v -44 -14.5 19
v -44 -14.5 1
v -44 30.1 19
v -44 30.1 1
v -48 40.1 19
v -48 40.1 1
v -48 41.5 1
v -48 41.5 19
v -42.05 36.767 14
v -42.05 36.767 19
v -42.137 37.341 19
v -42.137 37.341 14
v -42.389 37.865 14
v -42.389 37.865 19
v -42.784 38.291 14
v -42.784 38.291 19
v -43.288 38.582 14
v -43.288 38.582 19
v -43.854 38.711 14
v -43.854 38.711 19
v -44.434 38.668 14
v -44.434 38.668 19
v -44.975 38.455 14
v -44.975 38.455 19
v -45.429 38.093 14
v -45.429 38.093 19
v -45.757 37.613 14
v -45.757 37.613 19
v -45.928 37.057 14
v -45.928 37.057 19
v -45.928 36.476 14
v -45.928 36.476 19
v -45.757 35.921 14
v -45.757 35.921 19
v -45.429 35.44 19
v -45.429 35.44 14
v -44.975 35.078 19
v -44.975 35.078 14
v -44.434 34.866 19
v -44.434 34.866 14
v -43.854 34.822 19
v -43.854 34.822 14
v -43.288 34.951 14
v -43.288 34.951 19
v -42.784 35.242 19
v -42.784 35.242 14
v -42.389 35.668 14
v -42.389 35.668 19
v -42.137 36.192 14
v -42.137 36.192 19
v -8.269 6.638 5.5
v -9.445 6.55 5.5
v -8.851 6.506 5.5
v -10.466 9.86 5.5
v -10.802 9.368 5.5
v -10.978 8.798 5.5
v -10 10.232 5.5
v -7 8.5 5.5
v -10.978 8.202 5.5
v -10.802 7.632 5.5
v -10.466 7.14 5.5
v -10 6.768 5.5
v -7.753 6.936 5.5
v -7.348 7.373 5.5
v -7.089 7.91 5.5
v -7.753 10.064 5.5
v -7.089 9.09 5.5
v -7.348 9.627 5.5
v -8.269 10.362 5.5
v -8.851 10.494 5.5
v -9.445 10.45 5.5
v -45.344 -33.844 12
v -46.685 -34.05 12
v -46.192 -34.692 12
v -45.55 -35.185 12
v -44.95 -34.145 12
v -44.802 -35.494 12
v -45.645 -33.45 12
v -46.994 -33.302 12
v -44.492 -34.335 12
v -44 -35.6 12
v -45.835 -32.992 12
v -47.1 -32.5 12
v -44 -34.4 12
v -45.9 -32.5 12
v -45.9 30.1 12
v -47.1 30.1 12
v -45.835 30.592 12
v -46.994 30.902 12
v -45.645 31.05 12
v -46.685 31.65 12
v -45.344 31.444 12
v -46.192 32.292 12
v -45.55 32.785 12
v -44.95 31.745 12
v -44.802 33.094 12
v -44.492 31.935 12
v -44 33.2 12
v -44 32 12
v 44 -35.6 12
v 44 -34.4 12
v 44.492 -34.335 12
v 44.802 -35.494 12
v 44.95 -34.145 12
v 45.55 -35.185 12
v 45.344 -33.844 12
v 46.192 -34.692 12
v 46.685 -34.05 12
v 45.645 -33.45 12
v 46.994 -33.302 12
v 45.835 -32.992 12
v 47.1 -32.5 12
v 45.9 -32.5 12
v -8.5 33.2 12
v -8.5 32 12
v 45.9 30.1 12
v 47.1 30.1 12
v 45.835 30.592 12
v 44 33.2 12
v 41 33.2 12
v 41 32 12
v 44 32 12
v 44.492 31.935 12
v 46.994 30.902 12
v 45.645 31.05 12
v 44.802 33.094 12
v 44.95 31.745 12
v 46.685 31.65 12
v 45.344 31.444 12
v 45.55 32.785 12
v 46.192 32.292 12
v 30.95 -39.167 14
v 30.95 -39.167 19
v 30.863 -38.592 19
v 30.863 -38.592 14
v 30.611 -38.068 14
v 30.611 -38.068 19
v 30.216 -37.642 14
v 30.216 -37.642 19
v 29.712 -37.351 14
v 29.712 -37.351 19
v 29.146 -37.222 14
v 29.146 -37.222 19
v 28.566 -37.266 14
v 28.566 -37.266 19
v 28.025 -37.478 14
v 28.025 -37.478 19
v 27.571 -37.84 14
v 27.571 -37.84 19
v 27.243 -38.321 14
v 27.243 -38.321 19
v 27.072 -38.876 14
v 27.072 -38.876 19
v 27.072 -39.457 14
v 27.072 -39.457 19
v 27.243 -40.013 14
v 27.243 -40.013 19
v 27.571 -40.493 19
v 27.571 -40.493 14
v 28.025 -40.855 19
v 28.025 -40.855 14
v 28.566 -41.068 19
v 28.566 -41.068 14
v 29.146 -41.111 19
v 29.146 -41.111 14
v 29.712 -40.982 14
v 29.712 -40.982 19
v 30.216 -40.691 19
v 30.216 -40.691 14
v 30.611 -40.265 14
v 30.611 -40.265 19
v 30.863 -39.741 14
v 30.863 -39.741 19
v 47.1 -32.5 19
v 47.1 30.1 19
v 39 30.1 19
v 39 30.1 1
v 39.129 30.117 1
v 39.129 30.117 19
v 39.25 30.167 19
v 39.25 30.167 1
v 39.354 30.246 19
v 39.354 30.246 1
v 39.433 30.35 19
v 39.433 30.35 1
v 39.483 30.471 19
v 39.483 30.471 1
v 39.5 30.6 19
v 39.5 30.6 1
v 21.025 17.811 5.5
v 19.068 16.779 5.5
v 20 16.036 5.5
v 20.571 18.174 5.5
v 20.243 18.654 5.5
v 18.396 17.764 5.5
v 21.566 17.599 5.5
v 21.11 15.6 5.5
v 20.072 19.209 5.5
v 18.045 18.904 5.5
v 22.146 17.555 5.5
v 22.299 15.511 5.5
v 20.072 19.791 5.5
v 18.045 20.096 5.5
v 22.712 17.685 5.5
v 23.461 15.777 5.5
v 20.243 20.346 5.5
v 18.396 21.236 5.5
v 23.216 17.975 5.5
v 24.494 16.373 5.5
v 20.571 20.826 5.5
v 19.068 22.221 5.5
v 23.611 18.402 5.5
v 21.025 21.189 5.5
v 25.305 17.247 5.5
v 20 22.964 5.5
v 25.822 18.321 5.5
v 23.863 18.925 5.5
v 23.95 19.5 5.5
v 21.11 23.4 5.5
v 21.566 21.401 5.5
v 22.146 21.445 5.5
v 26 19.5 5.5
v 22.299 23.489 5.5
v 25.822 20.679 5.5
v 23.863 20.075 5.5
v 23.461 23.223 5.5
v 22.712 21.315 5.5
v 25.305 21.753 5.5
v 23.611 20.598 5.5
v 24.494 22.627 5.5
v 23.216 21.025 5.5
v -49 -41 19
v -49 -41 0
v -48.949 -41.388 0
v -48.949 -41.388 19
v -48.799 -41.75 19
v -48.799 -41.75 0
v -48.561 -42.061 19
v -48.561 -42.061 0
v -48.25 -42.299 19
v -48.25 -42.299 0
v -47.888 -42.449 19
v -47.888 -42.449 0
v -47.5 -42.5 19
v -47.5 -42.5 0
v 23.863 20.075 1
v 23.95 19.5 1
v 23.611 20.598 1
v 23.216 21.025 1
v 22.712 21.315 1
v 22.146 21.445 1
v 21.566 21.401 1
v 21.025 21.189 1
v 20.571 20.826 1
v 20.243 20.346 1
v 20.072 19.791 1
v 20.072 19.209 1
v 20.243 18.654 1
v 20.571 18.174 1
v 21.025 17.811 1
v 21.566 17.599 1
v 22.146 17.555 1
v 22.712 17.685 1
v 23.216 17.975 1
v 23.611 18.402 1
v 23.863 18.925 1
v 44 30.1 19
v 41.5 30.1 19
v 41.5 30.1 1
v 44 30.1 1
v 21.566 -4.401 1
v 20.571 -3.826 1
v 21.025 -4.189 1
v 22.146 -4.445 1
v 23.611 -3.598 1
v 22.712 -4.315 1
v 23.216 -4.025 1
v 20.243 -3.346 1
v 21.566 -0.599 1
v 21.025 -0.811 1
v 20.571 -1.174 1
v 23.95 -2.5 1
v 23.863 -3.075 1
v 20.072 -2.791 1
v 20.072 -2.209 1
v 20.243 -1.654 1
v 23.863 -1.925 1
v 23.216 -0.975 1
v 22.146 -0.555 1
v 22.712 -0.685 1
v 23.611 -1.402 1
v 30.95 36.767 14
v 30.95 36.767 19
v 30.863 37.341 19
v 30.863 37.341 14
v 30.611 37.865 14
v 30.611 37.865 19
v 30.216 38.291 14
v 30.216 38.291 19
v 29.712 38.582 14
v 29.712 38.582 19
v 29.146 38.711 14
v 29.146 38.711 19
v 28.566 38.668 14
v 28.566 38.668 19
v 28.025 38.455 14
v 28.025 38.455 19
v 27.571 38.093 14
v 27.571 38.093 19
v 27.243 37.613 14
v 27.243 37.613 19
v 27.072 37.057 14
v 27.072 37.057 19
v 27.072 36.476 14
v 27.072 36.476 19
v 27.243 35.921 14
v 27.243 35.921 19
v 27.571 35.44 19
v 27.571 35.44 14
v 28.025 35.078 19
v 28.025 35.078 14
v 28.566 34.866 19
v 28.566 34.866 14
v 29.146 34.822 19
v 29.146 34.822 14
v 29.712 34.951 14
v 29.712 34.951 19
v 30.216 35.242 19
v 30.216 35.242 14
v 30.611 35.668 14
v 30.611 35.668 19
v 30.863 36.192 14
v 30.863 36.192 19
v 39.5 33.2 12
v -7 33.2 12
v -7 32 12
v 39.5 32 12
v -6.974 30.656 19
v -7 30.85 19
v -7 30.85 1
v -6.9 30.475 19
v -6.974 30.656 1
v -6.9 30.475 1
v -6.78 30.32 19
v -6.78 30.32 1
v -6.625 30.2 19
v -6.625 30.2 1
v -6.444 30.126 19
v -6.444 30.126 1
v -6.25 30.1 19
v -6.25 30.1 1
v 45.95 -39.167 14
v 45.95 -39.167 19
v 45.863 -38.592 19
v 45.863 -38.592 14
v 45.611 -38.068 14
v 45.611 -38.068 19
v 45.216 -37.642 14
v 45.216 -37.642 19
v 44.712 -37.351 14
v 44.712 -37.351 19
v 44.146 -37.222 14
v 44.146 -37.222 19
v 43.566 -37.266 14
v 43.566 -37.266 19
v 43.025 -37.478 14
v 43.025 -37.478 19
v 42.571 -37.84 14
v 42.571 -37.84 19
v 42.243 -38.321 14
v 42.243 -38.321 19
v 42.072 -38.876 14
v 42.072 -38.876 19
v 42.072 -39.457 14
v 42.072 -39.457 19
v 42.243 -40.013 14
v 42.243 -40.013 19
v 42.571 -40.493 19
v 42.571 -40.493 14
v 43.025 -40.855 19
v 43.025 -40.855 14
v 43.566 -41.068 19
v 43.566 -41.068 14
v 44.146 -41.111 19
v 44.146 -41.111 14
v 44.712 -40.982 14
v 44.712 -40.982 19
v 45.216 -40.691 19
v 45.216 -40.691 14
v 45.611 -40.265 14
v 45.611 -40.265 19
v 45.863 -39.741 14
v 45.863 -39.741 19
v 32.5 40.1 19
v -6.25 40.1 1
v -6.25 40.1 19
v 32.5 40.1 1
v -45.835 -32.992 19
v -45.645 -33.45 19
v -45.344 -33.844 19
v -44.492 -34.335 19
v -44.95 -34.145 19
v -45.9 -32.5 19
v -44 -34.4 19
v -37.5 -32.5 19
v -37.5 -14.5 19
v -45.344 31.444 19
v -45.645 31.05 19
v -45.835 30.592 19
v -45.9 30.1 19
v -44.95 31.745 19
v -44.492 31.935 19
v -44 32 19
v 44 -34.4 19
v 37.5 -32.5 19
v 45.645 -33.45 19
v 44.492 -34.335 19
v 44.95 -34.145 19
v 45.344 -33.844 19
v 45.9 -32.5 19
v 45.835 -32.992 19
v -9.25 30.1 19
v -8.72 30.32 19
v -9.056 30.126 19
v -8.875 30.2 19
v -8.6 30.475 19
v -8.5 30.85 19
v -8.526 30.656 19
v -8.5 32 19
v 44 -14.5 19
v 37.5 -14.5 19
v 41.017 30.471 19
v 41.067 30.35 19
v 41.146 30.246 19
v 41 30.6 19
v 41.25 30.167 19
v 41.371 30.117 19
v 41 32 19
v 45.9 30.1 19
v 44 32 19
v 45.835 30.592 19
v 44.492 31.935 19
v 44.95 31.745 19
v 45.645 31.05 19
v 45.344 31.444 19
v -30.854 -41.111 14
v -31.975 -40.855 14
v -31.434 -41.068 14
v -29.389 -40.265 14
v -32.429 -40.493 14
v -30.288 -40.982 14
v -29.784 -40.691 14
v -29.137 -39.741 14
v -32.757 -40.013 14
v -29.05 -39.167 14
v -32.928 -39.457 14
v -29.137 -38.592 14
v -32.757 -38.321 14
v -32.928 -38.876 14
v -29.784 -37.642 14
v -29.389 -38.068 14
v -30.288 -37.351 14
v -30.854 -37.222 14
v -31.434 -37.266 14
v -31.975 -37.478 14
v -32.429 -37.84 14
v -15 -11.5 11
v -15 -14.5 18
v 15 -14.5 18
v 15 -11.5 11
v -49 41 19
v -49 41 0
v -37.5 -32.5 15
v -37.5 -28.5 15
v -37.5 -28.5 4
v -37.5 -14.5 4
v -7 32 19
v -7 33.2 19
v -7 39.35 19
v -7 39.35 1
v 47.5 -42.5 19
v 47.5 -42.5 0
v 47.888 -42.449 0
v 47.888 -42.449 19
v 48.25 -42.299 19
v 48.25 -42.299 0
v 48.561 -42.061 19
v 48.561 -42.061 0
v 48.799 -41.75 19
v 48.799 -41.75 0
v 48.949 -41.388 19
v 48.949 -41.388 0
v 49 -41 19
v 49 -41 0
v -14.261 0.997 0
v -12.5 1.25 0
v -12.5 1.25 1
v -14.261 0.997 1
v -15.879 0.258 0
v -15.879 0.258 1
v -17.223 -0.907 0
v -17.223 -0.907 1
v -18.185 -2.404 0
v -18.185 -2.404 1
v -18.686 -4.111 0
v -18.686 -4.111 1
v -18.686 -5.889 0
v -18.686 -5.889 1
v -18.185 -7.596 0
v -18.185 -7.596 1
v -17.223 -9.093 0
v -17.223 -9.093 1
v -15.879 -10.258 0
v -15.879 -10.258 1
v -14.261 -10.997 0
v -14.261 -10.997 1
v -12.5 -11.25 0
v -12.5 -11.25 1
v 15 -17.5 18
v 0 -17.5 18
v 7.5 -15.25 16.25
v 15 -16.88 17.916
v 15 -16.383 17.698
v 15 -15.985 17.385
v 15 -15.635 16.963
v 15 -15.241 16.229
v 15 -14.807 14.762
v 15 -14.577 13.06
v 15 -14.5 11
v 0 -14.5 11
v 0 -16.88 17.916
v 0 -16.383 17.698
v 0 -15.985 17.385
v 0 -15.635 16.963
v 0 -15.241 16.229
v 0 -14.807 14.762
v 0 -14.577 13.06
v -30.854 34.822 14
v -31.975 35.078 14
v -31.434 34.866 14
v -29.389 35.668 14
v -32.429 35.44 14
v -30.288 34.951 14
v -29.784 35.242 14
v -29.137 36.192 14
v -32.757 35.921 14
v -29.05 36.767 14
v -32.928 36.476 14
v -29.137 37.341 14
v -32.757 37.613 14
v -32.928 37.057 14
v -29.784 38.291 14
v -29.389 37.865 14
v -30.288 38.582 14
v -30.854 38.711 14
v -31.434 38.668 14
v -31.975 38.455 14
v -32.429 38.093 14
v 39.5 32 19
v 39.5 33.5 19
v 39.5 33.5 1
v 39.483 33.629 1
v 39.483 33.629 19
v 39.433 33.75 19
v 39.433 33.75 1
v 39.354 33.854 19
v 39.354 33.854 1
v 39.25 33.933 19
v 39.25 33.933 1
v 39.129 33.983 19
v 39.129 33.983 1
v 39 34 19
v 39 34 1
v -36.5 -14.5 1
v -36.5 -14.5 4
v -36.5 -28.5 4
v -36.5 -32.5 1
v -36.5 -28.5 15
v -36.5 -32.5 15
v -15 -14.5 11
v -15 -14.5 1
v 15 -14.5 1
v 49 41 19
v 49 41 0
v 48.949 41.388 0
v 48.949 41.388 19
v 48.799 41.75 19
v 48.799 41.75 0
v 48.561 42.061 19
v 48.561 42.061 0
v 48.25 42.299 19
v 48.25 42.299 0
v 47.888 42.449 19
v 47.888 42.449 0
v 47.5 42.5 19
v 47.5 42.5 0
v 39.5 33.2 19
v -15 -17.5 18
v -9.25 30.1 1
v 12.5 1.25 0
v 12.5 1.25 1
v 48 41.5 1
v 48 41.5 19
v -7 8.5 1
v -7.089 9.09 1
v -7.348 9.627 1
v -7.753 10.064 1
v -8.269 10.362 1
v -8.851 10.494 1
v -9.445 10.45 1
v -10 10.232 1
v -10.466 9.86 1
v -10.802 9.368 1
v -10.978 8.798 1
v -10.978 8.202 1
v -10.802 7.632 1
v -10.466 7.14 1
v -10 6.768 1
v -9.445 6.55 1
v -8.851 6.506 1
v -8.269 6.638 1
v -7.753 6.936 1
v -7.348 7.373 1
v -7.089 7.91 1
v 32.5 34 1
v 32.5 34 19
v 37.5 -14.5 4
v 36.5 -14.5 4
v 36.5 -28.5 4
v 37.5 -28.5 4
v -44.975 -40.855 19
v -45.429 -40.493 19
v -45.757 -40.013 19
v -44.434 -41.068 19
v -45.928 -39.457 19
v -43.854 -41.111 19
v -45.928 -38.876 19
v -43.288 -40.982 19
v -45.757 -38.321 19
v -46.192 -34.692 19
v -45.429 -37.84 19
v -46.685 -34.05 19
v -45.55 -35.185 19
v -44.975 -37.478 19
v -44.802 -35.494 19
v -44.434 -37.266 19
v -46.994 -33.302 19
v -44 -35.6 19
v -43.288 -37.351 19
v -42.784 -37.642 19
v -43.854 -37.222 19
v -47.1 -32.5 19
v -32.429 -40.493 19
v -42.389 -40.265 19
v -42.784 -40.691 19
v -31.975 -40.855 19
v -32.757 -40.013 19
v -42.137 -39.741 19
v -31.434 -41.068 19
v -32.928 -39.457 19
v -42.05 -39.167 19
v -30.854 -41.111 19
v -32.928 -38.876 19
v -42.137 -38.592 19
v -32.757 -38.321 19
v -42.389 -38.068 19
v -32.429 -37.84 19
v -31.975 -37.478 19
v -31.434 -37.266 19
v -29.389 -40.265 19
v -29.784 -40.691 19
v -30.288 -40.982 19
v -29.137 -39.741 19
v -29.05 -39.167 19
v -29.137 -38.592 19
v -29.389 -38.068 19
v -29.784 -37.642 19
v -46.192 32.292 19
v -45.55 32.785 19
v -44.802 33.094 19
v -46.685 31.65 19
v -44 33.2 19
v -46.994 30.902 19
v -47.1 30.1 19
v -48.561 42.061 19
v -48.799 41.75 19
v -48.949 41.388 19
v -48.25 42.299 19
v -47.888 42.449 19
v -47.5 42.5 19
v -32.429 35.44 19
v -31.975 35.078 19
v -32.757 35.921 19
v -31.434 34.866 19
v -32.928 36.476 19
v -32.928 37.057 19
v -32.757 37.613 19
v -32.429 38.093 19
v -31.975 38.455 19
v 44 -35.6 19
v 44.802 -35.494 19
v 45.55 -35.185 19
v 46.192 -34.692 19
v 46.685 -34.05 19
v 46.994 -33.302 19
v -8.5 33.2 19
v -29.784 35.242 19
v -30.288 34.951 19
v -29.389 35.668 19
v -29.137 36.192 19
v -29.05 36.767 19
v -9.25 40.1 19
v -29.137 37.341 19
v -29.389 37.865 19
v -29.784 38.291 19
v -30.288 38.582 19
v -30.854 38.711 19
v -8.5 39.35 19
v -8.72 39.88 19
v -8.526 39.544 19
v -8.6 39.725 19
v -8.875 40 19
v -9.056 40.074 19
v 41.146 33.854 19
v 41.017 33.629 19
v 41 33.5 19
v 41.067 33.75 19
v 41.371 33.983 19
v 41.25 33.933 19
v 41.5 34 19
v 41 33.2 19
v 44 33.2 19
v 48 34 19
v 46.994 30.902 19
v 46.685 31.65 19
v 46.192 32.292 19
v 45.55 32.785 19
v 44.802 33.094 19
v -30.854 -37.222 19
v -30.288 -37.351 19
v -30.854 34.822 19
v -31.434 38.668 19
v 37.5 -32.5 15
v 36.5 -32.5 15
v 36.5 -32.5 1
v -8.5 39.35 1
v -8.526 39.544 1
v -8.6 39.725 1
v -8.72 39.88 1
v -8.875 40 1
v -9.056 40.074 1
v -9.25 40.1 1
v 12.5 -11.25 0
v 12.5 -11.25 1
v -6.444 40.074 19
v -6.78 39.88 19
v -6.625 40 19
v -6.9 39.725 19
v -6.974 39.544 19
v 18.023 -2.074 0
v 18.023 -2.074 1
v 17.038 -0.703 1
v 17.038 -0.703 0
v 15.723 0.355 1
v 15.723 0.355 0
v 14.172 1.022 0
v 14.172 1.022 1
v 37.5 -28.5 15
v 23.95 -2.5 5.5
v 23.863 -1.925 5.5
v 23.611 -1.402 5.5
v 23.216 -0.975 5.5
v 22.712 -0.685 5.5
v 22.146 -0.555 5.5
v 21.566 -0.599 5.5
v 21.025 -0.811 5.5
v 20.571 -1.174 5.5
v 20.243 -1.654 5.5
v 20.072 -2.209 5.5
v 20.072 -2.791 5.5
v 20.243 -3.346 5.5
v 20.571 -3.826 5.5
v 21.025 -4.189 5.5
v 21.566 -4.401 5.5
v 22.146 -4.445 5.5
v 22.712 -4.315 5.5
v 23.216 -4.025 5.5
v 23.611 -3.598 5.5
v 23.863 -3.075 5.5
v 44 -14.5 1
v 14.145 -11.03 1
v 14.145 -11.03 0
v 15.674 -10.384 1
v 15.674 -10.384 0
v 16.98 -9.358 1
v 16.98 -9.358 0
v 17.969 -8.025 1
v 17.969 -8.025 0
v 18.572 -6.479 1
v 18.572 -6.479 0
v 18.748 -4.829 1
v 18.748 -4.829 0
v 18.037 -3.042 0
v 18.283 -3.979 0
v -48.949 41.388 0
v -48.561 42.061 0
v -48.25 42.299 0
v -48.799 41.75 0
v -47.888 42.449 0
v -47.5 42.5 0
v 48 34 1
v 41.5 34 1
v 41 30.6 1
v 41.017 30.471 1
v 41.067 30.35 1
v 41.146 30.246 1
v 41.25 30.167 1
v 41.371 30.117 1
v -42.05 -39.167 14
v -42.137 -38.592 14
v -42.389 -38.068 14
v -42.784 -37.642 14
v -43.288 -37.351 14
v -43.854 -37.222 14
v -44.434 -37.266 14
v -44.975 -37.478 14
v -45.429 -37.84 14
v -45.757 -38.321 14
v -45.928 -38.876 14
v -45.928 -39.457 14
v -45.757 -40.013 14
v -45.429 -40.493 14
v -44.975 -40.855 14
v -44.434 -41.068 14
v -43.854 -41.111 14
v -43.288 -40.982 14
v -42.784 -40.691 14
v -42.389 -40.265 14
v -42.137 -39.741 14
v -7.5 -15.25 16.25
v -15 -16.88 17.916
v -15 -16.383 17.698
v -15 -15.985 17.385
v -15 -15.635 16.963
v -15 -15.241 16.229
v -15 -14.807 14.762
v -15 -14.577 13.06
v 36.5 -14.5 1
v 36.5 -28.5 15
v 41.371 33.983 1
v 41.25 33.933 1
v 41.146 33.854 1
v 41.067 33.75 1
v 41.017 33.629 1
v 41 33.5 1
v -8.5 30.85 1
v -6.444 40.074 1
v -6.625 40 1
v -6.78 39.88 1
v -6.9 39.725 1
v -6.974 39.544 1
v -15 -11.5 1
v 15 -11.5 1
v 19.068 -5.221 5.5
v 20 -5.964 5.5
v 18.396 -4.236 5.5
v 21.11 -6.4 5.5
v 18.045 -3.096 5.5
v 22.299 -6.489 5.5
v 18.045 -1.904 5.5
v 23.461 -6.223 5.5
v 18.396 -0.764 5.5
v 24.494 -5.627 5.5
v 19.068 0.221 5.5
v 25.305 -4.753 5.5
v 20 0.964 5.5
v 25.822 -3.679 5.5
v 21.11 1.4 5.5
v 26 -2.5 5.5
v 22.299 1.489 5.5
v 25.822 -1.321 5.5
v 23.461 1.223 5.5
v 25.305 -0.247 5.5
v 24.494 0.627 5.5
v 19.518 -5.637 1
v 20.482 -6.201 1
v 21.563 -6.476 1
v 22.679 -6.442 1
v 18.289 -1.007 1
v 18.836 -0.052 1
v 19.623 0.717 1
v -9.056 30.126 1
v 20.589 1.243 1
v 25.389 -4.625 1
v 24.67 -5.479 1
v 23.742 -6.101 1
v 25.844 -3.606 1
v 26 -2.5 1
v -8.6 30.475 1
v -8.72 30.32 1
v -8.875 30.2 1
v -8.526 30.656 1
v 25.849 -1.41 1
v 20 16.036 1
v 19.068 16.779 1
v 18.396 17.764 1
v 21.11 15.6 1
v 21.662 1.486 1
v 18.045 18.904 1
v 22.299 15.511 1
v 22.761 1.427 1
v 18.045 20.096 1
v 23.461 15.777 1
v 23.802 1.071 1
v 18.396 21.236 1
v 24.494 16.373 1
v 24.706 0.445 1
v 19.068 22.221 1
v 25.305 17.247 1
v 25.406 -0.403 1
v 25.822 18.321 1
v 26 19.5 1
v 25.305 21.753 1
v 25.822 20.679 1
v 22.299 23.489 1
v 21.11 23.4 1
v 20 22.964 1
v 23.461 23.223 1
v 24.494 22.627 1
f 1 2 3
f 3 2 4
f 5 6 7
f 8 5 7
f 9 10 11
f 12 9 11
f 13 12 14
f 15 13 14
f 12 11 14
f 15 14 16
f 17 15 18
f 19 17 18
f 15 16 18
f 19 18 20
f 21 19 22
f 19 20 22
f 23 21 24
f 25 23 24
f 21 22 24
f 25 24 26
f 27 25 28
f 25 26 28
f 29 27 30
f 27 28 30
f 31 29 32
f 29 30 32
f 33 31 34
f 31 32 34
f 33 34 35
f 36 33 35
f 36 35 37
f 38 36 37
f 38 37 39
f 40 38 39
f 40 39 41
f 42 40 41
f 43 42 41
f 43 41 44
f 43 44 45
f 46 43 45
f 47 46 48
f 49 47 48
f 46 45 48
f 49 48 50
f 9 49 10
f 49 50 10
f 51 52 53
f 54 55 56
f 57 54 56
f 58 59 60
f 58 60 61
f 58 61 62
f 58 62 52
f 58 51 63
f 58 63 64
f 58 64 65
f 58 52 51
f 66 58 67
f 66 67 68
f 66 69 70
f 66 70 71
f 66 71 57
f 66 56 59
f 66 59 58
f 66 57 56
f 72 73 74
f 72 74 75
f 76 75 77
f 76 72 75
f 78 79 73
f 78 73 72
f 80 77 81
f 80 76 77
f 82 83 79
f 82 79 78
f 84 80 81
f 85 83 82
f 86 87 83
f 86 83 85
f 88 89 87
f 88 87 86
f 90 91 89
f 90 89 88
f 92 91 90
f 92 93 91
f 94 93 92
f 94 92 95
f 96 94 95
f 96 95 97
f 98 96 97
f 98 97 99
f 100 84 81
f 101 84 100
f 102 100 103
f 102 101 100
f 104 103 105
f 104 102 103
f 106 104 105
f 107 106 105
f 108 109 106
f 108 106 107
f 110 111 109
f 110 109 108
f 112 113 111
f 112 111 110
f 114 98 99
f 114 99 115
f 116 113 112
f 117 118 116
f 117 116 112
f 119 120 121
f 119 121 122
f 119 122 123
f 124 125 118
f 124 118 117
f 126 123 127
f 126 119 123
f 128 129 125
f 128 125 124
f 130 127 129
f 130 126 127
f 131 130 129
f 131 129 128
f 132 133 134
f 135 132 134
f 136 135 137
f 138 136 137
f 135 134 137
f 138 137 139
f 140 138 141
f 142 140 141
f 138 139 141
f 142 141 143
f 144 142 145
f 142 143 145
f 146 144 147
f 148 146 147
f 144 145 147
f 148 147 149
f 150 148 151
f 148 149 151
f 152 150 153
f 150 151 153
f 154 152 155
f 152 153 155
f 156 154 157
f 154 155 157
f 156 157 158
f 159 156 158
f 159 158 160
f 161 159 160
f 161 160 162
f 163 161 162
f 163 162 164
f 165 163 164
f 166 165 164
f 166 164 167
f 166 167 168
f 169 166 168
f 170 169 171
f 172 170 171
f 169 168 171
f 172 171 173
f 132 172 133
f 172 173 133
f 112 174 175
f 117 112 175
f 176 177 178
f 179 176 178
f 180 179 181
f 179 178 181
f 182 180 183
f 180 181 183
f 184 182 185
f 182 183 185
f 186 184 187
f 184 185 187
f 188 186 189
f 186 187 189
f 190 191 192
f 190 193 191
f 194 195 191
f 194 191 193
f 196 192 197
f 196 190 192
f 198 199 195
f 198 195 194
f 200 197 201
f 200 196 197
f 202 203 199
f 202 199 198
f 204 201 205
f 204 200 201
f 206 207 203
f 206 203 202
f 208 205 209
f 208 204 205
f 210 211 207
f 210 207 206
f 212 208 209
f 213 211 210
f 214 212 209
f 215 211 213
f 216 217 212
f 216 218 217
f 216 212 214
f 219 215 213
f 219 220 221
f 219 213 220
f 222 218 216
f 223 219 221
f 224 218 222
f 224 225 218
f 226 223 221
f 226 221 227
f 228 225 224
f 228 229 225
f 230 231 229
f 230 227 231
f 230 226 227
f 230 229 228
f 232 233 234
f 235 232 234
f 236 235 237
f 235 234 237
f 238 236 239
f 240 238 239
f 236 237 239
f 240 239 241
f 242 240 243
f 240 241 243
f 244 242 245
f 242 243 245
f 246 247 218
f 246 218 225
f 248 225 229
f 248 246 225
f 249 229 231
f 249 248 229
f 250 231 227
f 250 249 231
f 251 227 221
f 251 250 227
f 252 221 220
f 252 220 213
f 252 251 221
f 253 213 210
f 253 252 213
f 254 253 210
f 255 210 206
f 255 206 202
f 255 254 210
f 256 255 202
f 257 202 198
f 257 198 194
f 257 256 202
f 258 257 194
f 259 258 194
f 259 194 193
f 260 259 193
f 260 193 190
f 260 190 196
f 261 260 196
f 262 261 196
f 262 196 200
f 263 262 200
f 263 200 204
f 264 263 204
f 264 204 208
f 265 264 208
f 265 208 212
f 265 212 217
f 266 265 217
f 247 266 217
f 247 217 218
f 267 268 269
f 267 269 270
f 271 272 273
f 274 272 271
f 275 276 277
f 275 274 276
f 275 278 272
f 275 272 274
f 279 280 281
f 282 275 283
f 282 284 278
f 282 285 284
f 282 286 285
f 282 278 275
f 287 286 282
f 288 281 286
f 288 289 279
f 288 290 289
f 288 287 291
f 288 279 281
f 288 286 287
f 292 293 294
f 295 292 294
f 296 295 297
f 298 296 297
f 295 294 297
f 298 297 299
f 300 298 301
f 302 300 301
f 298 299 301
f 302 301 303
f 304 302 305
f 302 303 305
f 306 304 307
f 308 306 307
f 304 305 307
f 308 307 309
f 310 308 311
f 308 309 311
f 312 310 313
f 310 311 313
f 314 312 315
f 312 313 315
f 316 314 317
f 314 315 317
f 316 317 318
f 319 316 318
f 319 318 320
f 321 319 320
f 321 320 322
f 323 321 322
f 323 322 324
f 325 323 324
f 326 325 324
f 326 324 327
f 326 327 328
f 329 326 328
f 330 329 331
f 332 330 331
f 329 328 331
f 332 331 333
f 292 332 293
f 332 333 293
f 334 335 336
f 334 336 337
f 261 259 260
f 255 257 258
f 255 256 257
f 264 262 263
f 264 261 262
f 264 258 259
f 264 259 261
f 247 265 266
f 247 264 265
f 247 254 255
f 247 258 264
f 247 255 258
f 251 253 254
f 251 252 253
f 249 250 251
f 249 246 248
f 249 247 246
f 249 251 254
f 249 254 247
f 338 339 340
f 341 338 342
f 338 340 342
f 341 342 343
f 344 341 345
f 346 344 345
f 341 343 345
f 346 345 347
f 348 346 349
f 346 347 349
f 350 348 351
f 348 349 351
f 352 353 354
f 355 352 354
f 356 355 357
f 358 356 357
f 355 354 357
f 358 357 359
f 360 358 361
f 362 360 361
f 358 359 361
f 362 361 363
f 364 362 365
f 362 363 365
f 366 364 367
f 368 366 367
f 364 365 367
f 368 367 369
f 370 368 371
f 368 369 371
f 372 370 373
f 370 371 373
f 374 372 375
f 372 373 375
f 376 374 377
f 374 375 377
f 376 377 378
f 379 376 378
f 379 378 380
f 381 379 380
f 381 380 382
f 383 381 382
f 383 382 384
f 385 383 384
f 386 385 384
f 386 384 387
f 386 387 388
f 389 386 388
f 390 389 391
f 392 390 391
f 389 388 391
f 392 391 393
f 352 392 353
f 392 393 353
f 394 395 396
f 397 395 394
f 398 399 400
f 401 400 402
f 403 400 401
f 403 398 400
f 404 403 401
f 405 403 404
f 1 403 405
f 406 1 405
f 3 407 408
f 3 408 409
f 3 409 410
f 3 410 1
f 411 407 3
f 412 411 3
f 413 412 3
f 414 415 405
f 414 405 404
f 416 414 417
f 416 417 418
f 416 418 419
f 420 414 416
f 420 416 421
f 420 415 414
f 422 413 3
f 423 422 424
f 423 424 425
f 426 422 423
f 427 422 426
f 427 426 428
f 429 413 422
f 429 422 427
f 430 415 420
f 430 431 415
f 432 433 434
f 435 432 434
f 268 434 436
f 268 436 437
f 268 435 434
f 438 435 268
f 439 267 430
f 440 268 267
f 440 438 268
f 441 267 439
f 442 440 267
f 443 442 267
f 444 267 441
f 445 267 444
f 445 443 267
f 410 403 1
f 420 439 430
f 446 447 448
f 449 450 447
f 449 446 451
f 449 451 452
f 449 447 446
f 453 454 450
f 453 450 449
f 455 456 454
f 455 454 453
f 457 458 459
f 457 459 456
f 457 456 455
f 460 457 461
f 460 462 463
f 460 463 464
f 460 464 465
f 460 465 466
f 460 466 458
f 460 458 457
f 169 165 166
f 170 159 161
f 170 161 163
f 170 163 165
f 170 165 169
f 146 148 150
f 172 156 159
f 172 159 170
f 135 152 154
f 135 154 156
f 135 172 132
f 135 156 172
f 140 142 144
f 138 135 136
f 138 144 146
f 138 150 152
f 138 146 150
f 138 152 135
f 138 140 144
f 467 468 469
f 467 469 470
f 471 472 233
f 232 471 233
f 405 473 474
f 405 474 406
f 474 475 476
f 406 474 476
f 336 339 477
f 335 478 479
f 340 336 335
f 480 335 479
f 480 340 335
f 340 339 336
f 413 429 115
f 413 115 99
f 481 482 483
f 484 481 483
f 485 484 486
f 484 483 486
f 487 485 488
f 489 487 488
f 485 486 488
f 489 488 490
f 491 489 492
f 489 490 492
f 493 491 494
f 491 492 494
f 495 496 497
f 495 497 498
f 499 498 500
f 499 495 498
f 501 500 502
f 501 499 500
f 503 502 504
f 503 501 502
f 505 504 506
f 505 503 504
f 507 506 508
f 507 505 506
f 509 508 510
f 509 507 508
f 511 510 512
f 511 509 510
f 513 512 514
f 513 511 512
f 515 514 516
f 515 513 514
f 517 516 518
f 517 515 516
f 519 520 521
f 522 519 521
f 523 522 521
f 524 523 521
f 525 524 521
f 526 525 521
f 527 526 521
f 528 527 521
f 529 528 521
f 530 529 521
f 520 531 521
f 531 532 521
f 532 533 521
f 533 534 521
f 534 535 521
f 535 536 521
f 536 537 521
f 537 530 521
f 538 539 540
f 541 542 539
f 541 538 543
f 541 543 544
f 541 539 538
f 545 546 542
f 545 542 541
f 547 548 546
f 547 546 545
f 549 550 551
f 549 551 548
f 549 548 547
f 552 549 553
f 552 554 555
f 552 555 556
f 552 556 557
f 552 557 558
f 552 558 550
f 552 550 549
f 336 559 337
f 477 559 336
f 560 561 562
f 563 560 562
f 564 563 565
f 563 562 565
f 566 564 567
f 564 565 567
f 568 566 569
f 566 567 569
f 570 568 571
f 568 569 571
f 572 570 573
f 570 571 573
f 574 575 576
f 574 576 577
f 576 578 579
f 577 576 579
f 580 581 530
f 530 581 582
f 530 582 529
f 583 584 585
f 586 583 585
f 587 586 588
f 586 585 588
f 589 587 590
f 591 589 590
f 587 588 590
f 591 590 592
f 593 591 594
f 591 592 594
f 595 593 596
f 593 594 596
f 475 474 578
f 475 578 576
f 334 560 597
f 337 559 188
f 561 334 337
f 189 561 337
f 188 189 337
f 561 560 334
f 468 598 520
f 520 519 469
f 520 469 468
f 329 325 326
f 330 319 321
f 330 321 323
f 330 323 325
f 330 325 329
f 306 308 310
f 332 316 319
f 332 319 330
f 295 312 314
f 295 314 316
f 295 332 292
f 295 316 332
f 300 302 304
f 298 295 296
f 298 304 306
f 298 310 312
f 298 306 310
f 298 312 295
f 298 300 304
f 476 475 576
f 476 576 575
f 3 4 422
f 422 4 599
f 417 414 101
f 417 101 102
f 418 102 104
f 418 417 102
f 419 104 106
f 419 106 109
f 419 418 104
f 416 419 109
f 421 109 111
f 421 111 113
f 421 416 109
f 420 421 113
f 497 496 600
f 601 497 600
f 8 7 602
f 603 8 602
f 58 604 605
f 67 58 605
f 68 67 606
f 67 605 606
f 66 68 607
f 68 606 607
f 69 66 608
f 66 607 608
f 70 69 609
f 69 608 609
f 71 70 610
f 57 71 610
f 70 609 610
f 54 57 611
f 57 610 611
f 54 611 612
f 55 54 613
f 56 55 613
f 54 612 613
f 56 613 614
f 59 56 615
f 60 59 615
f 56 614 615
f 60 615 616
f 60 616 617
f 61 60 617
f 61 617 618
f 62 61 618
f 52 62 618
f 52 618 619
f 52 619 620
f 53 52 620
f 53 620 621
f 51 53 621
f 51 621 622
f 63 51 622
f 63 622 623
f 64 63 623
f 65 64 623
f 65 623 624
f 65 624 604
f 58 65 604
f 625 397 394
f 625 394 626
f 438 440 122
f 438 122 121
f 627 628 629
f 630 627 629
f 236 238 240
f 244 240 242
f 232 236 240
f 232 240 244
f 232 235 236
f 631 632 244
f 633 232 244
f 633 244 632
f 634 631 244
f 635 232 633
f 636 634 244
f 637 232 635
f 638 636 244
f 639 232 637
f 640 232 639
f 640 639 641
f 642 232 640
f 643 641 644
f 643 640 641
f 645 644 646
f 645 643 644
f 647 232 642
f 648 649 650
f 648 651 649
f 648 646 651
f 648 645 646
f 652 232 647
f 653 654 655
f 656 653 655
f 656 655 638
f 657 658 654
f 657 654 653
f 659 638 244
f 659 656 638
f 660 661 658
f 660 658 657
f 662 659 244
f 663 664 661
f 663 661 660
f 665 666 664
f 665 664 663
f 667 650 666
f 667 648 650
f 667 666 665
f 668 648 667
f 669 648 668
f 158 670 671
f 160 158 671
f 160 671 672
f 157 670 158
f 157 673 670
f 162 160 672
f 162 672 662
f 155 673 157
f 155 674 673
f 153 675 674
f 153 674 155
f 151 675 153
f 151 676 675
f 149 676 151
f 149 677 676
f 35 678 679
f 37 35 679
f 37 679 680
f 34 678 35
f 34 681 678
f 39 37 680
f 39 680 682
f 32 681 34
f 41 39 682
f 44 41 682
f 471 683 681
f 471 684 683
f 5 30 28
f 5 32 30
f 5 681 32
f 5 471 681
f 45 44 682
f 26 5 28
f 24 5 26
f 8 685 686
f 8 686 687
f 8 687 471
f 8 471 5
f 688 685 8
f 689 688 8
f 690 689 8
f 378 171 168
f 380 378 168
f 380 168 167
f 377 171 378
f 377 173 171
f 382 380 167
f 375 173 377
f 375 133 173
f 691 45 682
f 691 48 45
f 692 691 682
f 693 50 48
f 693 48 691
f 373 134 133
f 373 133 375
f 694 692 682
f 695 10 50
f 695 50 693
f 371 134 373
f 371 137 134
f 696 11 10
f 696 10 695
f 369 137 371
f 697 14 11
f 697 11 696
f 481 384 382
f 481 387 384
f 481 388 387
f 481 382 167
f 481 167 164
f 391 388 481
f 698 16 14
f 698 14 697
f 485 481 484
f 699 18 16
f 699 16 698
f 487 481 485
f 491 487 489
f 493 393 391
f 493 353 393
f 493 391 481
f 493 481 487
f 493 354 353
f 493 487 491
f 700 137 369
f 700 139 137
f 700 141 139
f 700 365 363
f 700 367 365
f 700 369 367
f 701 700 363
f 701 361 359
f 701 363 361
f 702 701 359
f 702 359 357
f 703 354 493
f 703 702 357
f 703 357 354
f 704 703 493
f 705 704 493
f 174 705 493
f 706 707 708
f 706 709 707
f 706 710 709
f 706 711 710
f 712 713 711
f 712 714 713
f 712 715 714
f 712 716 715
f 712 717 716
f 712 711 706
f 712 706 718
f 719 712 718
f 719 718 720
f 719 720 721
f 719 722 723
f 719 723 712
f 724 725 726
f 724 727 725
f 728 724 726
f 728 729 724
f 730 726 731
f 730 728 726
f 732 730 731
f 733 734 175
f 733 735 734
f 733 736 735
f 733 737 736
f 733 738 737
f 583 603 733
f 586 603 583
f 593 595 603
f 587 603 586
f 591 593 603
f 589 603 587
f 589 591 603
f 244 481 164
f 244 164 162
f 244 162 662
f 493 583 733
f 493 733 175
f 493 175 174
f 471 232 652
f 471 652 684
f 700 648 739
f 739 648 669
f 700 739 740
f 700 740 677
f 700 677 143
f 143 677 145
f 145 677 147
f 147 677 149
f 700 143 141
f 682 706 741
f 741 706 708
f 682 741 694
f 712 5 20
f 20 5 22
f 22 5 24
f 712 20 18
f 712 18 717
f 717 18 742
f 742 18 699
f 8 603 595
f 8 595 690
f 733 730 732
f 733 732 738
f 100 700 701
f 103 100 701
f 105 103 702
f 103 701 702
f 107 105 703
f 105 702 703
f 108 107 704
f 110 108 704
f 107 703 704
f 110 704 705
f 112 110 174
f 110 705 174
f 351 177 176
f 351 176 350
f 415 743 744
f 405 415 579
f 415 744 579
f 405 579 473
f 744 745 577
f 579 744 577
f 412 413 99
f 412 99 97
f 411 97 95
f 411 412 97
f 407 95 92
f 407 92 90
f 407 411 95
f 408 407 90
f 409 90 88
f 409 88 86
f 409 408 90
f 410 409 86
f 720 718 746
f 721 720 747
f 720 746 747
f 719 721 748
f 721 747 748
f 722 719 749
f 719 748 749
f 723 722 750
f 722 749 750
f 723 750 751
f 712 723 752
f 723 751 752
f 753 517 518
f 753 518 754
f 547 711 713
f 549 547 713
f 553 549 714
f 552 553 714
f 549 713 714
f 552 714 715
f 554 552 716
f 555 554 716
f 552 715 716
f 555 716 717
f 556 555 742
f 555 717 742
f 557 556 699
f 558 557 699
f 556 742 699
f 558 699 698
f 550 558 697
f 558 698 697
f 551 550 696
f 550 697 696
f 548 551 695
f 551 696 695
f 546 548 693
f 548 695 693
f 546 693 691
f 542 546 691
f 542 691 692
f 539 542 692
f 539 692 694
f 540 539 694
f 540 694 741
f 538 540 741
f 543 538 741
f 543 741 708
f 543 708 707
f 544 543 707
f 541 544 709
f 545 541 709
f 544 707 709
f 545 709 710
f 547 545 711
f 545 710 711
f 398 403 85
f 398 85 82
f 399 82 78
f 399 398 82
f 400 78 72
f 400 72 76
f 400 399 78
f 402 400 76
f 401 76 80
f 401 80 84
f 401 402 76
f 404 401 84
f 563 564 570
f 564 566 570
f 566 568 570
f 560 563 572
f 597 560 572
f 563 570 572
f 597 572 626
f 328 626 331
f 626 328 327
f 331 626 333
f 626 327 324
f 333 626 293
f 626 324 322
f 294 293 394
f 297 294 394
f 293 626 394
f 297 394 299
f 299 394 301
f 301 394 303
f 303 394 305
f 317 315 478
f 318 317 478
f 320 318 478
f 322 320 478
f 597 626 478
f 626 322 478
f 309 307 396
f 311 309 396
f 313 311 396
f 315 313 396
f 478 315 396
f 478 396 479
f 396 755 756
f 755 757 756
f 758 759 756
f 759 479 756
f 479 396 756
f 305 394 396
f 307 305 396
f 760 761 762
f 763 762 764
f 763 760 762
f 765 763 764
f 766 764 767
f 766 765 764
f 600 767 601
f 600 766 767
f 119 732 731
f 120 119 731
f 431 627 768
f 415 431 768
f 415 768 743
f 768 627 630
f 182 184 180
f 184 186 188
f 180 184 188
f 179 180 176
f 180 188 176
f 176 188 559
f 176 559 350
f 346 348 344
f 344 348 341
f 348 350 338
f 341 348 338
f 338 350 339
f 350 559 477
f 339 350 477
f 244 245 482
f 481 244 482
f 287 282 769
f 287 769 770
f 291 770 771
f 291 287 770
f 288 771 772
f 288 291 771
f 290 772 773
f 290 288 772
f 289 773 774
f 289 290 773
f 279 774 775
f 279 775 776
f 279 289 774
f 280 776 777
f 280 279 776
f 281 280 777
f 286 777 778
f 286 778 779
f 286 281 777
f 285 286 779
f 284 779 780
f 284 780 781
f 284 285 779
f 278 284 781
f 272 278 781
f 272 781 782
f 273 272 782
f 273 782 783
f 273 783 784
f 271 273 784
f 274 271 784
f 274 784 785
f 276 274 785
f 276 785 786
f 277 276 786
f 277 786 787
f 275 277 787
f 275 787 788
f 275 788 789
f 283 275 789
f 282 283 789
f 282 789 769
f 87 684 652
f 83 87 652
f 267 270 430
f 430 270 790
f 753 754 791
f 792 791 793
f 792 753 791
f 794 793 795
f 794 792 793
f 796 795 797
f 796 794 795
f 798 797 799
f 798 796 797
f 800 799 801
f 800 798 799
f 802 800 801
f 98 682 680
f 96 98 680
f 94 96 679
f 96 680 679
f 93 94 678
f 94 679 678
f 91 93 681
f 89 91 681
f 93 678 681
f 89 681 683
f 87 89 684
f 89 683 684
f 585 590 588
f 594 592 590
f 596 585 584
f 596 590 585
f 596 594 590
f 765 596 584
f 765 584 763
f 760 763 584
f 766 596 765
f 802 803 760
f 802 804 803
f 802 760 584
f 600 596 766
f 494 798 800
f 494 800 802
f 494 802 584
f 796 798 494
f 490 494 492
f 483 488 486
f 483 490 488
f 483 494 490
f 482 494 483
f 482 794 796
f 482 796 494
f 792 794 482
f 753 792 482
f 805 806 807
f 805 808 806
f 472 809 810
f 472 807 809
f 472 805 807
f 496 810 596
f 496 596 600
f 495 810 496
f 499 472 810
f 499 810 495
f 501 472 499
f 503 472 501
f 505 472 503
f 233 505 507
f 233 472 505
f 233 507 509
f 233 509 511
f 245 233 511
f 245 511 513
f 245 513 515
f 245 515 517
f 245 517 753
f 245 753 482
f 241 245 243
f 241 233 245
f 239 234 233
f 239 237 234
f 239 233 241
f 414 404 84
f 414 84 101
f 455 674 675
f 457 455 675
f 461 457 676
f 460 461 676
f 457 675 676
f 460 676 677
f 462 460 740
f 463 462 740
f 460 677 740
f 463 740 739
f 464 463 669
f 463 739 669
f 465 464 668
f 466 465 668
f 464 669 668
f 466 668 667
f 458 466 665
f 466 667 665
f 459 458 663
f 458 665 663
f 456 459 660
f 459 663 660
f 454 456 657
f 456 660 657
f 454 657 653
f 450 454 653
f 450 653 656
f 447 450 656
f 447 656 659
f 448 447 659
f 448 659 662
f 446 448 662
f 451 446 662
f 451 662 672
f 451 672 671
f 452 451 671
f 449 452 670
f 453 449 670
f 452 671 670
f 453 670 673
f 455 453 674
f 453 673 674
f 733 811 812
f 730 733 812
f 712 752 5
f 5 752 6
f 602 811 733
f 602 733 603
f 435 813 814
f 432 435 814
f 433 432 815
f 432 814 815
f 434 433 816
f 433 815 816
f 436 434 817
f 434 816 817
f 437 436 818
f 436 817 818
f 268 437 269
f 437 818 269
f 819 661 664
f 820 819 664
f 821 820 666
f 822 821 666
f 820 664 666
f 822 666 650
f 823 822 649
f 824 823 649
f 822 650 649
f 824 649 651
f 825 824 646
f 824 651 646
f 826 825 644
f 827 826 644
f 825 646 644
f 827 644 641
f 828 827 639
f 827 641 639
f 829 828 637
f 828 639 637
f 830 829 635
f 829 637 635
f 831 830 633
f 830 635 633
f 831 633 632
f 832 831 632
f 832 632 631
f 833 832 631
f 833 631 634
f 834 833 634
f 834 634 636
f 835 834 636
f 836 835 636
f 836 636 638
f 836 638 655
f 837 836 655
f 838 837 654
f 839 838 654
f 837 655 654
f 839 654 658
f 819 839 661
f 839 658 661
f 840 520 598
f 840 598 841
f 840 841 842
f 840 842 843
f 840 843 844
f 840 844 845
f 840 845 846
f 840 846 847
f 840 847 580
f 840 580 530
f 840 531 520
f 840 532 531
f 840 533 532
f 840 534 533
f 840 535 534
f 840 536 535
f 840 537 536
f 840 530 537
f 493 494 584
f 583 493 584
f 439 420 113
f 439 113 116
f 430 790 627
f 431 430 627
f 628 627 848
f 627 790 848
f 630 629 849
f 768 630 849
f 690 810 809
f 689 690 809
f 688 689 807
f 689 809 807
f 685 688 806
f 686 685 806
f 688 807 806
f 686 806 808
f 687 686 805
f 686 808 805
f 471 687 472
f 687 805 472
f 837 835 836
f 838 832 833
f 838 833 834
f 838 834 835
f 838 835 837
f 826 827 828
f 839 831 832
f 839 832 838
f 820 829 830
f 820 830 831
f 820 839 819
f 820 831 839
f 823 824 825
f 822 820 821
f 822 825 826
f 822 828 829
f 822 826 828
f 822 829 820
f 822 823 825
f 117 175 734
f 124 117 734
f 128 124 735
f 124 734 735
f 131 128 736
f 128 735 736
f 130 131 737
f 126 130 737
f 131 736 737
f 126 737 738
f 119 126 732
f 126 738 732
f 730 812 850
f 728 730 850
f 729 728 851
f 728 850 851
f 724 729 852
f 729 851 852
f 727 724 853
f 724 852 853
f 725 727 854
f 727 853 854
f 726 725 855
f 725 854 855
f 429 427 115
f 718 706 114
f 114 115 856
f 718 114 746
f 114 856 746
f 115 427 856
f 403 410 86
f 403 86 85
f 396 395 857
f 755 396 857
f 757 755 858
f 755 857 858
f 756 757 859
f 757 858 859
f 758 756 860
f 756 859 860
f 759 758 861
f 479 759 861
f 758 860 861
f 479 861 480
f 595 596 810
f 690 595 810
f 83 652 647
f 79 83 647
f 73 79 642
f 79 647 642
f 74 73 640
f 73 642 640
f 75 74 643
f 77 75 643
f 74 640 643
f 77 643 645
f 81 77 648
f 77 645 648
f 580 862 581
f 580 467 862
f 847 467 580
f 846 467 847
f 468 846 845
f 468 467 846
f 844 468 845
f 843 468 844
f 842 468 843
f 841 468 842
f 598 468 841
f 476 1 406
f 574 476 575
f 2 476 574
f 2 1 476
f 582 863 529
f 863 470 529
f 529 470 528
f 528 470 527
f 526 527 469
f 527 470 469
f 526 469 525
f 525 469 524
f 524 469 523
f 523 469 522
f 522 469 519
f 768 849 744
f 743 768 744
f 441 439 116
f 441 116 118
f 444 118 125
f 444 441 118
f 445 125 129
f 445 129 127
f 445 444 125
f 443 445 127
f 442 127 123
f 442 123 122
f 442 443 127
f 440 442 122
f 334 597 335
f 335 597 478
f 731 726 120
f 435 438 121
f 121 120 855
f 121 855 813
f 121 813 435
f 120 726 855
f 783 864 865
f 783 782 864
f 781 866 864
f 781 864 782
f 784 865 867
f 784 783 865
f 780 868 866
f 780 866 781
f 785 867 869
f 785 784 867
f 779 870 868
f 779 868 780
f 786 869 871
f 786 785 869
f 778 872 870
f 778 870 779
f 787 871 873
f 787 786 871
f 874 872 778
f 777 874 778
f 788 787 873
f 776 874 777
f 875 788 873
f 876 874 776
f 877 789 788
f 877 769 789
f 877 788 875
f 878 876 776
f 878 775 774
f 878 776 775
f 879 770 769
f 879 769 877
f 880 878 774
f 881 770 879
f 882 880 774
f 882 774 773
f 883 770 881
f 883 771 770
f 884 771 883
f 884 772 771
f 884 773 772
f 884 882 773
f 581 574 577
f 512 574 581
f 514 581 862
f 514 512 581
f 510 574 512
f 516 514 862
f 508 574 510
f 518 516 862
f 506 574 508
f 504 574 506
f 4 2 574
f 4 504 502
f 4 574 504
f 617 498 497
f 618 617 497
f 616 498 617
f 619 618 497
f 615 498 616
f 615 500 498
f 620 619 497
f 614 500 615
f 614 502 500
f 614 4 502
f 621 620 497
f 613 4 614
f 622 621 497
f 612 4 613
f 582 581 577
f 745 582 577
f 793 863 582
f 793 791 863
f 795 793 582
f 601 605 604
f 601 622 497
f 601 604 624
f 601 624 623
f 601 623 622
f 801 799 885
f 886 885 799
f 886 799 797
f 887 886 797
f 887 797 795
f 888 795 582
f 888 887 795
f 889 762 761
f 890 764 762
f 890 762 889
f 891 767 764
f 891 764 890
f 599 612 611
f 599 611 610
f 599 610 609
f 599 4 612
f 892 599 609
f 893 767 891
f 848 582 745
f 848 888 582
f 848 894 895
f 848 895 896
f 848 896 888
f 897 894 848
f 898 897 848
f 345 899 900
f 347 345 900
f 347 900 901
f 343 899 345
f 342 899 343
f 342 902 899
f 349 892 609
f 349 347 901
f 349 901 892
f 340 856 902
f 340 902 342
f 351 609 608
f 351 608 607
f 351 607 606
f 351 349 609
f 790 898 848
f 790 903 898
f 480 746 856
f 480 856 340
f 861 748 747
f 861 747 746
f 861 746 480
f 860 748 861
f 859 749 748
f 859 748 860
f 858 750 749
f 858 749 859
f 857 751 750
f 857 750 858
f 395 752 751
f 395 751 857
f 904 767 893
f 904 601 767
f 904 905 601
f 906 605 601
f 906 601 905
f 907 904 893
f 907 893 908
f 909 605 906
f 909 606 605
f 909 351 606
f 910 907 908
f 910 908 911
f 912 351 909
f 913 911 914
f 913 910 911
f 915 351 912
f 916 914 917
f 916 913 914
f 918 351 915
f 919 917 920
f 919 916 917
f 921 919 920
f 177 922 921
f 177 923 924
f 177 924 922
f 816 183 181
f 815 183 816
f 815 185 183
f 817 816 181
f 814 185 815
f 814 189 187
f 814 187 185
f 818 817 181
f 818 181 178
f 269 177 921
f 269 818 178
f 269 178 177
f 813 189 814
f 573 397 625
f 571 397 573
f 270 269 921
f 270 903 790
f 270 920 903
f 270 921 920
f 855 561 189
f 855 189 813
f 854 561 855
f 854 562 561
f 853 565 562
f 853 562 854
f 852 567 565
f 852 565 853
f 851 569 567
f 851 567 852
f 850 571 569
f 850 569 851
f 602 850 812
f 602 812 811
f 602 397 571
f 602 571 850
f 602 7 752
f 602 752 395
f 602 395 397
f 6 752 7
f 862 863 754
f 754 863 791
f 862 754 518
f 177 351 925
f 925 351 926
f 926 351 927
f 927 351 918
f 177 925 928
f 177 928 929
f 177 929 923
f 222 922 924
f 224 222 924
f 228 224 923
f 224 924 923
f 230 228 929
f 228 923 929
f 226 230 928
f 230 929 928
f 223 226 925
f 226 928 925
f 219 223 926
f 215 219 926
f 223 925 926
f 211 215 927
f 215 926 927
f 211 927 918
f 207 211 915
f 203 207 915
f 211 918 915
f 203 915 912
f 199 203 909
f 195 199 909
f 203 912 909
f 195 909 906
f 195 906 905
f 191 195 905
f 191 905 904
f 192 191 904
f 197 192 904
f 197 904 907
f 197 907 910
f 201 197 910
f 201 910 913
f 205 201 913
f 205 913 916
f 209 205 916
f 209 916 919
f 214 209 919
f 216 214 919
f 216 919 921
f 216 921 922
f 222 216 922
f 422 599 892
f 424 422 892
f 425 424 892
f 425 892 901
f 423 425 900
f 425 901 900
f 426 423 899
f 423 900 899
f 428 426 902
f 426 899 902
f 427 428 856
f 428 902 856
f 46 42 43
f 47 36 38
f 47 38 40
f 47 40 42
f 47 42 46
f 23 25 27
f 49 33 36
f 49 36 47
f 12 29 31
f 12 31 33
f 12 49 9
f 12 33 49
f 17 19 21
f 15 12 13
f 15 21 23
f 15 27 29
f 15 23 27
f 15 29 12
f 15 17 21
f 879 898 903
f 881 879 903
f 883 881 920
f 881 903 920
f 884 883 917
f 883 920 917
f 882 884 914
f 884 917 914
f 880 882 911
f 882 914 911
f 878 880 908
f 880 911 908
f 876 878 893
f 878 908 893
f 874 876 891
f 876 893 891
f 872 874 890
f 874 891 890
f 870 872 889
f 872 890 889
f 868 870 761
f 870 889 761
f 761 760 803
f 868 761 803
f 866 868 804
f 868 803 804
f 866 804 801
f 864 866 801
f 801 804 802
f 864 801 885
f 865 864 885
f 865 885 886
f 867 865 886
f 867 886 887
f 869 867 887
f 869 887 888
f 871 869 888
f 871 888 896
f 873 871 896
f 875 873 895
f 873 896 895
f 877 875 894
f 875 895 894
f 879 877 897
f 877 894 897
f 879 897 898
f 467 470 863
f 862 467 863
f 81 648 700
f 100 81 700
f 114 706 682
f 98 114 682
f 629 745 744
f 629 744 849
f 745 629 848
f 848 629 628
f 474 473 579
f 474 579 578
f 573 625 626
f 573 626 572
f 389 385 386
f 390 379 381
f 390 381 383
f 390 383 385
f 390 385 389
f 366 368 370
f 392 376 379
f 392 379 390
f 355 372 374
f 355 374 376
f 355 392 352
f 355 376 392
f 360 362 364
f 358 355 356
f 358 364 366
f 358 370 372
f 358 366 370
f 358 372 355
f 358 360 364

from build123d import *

# Parameters (mm, degrees)
PAD_DEPTH       = 1
PAD001_DEPTH    = 19
SKETCH002_R     = 4
SKETCH002_R_2   = 1.95
SKETCH002_R_3   = 2
PAD002_DEPTH    = 5.5
PAD003_DEPTH    = 15
POCKET_DEPTH    = 7
PAD004_DEPTH    = 1
SKETCH007_R     = 1.95
POCKET001_DEPTH = 5
PAD014_DEPTH    = 1


with BuildPart() as part:
    # Sketch → Pad (new body)
    with BuildSketch(Plane.XY):
        with BuildLine():
            Line((-47.5, -42.5), (47.5, -42.5))
            ThreePointArc((47.5, -42.5), (48.56066, -42.06066), (49, -41))
            Line((49, -41), (49, 41))
            ThreePointArc((49, 41), (48.56066, 42.06066), (47.5, 42.5))
            Line((47.5, 42.5), (-47.5, 42.5))
            ThreePointArc((-47.5, 42.5), (-48.56066, 42.06066), (-49, 41))
            Line((-49, 41), (-49, -41))
            ThreePointArc((-49, -41), (-48.56066, -42.06066), (-47.5, -42.5))
        make_face()
        with BuildLine():
            ThreePointArc((-12.5, 1.25), (-18.75, -5), (-12.5, -11.25))
            Line((-12.5, -11.25), (12.5, -11.25))
            ThreePointArc((12.5, -11.25), (18.75, -5), (12.5, 1.25))
            Line((-12.5, 1.25), (12.5, 1.25))
        make_face(mode=Mode.SUBTRACT)
    extrude(amount=PAD_DEPTH)

    # Sketch001 → Pad001 (join)
    with BuildSketch(Plane.XY):
        with BuildLine():
            Line((-47.5, -42.5), (47.5, -42.5))
            ThreePointArc((47.5, -42.5), (48.56066, -42.06066), (49, -41))
            Line((49, -41), (49, 41))
            ThreePointArc((49, 41), (48.56066, 42.06066), (47.5, 42.5))
            Line((47.5, 42.5), (-47.5, 42.5))
            ThreePointArc((-47.5, 42.5), (-48.56066, 42.06066), (-49, 41))
            Line((-49, 41), (-49, -41))
            ThreePointArc((-49, -41), (-48.56066, -42.06066), (-47.5, -42.5))
        make_face()
        with BuildLine():
            Line((44, 30.1), (44, -14.5))
            Line((44, -14.5), (37.5, -14.5))
            Line((37.5, -14.5), (37.5, -32.5))
            Line((37.5, -32.5), (-37.5, -32.5))
            Line((-37.5, -32.5), (-37.5, -14.5))
            Line((-37.5, -14.5), (-44, -14.5))
            Line((-44, -14.5), (-44, 30.1))
            Line((-44, 30.1), (-9.25, 30.1))
            ThreePointArc((-9.25, 30.1), (-8.71967, 30.31967), (-8.5, 30.85))
            Line((-8.5, 30.85), (-8.5, 39.35))
            ThreePointArc((-8.5, 39.35), (-8.71967, 39.88033), (-9.25, 40.1))
            Line((-9.25, 40.1), (-48, 40.1))
            Line((-48, 40.1), (-48, 41.5))
            Line((-48, 41.5), (48, 41.5))
            Line((48, 34), (48, 41.5))
            Line((48, 34), (41.5, 34))
            ThreePointArc((41.5, 34), (41.146447, 33.853553), (41, 33.5))
            Line((41, 33.5), (41, 30.6))
            ThreePointArc((41, 30.6), (41.146447, 30.246447), (41.5, 30.1))
            Line((41.5, 30.1), (44, 30.1))
        make_face(mode=Mode.SUBTRACT)
        with BuildLine():
            Line((-7, 30.85), (-7, 39.35))
            ThreePointArc((-6.25, 40.1), (-6.78033, 39.88033), (-7, 39.35))
            Line((-6.25, 40.1), (32.5, 40.1))
            Line((32.5, 40.1), (32.5, 34))
            Line((32.5, 34), (39, 34))
            ThreePointArc((39.5, 33.5), (39.353553, 33.853553), (39, 34))
            Line((39.5, 33.5), (39.5, 30.6))
            ThreePointArc((39, 30.1), (39.353553, 30.246447), (39.5, 30.6))
            Line((39, 30.1), (-6.25, 30.1))
            ThreePointArc((-7, 30.85), (-6.78033, 30.31967), (-6.25, 30.1))
        make_face()
    extrude(amount=PAD001_DEPTH)

    # Sketch002 → Pad002 (join)
    with BuildSketch(Plane.XY):
        with Locations((22, 19.5)):
            Circle(SKETCH002_R)
        with Locations((22, 19.5)):
            Circle(SKETCH002_R_2, mode=Mode.SUBTRACT)
        with Locations((22, -2.5)):
            Circle(SKETCH002_R)
        with Locations((22, -2.5)):
            Circle(SKETCH002_R_2, mode=Mode.SUBTRACT)
        with Locations((-9, 8.5)):
            Circle(SKETCH002_R_3)
    extrude(amount=PAD002_DEPTH)

    # Sketch003 → Pad003 (join, symmetric)
    with BuildSketch(Plane.YZ):
        with BuildLine():
            Line((-14.5, 0), (-14.5, 11))
            add(Edge.make_bspline(
                [(-17.5, 18), (-14.5, 18), (-14.5, 11)],
                knots=[0, 0, 0, 1, 1, 1], degree=2))
            Line((-17.5, 18), (-14.5, 18))
            Line((-14.5, 18), (-11.5, 11))
            Line((-11.5, 11), (-11.5, 0))
            Line((-11.5, 0), (-14.5, 0))
        make_face()
    extrude(amount=PAD003_DEPTH, both=True)

    # Sketch004 (on Face14 of Pad003) → Pocket (cut)
    with BuildSketch(Plane.XY.offset(19)):
        with BuildLine():
            Line((47.1, -32.5), (47.1, 30.1))
            ThreePointArc((47.1, 30.1), (46.192031, 32.292031), (44, 33.2))
            Line((44, 33.2), (-44, 33.2))
            ThreePointArc((-44, 33.2), (-46.192031, 32.292031), (-47.1, 30.1))
            Line((-47.1, 30.1), (-47.1, -32.5))
            ThreePointArc((-47.1, -32.5), (-46.192031, -34.692031), (-44, -35.6))
            Line((-44, -35.6), (44, -35.6))
            ThreePointArc((44, -35.6), (46.192031, -34.692031), (47.1, -32.5))
        make_face()
        with BuildLine():
            Line((45.9, -32.5), (45.9, 30.1))
            ThreePointArc((45.9, 30.1), (45.343503, 31.443503), (44, 32))
            Line((44, 32), (-44, 32))
            ThreePointArc((-44, 32), (-45.343503, 31.443503), (-45.9, 30.1))
            Line((-45.9, 30.1), (-45.9, -32.5))
            ThreePointArc((-45.9, -32.5), (-45.343503, -33.843503), (-44, -34.4))
            Line((-44, -34.4), (44, -34.4))
            ThreePointArc((44, -34.4), (45.343503, -33.843503), (45.9, -32.5))
        make_face(mode=Mode.SUBTRACT)
    extrude(amount=-POCKET_DEPTH, mode=Mode.SUBTRACT)

    # Sketch005 → Pad004 (join)
    with BuildSketch(Plane.YZ.offset(36.5)):
        Polygon((-14.5, 0), (-14.5, 4), (-28.5, 4), (-28.5, 15), (-32.5, 15), (-32.5, 0), align=None)
    extrude(amount=PAD004_DEPTH)

    # Sketch007 (on DatumPlane) → Pocket001 (cut)
    with BuildSketch(Plane.XY.offset(19)):
        with Locations((-44, -39.166667)):
            Circle(SKETCH007_R)
        with Locations((44, -39.166667)):
            Circle(SKETCH007_R)
        with Locations((-44, 36.766667)):
            Circle(SKETCH007_R)
        with Locations((29, 36.766667)):
            Circle(SKETCH007_R)
        with Locations((-31, 36.766667)):
            Circle(SKETCH007_R)
        with Locations((29, -39.166667)):
            Circle(SKETCH007_R)
        with Locations((-31, -39.166667)):
            Circle(SKETCH007_R)
    extrude(amount=-POCKET001_DEPTH, mode=Mode.SUBTRACT)

    # Sketch006 → Pad014 (join)
    with BuildSketch(Plane.YZ.offset(-37.5)):
        Polygon((-32.5, 0), (-32.5, 15), (-28.5, 15), (-28.5, 4), (-14.5, 4), (-14.5, 0), align=None)
    extrude(amount=PAD014_DEPTH)


solid = part.part
